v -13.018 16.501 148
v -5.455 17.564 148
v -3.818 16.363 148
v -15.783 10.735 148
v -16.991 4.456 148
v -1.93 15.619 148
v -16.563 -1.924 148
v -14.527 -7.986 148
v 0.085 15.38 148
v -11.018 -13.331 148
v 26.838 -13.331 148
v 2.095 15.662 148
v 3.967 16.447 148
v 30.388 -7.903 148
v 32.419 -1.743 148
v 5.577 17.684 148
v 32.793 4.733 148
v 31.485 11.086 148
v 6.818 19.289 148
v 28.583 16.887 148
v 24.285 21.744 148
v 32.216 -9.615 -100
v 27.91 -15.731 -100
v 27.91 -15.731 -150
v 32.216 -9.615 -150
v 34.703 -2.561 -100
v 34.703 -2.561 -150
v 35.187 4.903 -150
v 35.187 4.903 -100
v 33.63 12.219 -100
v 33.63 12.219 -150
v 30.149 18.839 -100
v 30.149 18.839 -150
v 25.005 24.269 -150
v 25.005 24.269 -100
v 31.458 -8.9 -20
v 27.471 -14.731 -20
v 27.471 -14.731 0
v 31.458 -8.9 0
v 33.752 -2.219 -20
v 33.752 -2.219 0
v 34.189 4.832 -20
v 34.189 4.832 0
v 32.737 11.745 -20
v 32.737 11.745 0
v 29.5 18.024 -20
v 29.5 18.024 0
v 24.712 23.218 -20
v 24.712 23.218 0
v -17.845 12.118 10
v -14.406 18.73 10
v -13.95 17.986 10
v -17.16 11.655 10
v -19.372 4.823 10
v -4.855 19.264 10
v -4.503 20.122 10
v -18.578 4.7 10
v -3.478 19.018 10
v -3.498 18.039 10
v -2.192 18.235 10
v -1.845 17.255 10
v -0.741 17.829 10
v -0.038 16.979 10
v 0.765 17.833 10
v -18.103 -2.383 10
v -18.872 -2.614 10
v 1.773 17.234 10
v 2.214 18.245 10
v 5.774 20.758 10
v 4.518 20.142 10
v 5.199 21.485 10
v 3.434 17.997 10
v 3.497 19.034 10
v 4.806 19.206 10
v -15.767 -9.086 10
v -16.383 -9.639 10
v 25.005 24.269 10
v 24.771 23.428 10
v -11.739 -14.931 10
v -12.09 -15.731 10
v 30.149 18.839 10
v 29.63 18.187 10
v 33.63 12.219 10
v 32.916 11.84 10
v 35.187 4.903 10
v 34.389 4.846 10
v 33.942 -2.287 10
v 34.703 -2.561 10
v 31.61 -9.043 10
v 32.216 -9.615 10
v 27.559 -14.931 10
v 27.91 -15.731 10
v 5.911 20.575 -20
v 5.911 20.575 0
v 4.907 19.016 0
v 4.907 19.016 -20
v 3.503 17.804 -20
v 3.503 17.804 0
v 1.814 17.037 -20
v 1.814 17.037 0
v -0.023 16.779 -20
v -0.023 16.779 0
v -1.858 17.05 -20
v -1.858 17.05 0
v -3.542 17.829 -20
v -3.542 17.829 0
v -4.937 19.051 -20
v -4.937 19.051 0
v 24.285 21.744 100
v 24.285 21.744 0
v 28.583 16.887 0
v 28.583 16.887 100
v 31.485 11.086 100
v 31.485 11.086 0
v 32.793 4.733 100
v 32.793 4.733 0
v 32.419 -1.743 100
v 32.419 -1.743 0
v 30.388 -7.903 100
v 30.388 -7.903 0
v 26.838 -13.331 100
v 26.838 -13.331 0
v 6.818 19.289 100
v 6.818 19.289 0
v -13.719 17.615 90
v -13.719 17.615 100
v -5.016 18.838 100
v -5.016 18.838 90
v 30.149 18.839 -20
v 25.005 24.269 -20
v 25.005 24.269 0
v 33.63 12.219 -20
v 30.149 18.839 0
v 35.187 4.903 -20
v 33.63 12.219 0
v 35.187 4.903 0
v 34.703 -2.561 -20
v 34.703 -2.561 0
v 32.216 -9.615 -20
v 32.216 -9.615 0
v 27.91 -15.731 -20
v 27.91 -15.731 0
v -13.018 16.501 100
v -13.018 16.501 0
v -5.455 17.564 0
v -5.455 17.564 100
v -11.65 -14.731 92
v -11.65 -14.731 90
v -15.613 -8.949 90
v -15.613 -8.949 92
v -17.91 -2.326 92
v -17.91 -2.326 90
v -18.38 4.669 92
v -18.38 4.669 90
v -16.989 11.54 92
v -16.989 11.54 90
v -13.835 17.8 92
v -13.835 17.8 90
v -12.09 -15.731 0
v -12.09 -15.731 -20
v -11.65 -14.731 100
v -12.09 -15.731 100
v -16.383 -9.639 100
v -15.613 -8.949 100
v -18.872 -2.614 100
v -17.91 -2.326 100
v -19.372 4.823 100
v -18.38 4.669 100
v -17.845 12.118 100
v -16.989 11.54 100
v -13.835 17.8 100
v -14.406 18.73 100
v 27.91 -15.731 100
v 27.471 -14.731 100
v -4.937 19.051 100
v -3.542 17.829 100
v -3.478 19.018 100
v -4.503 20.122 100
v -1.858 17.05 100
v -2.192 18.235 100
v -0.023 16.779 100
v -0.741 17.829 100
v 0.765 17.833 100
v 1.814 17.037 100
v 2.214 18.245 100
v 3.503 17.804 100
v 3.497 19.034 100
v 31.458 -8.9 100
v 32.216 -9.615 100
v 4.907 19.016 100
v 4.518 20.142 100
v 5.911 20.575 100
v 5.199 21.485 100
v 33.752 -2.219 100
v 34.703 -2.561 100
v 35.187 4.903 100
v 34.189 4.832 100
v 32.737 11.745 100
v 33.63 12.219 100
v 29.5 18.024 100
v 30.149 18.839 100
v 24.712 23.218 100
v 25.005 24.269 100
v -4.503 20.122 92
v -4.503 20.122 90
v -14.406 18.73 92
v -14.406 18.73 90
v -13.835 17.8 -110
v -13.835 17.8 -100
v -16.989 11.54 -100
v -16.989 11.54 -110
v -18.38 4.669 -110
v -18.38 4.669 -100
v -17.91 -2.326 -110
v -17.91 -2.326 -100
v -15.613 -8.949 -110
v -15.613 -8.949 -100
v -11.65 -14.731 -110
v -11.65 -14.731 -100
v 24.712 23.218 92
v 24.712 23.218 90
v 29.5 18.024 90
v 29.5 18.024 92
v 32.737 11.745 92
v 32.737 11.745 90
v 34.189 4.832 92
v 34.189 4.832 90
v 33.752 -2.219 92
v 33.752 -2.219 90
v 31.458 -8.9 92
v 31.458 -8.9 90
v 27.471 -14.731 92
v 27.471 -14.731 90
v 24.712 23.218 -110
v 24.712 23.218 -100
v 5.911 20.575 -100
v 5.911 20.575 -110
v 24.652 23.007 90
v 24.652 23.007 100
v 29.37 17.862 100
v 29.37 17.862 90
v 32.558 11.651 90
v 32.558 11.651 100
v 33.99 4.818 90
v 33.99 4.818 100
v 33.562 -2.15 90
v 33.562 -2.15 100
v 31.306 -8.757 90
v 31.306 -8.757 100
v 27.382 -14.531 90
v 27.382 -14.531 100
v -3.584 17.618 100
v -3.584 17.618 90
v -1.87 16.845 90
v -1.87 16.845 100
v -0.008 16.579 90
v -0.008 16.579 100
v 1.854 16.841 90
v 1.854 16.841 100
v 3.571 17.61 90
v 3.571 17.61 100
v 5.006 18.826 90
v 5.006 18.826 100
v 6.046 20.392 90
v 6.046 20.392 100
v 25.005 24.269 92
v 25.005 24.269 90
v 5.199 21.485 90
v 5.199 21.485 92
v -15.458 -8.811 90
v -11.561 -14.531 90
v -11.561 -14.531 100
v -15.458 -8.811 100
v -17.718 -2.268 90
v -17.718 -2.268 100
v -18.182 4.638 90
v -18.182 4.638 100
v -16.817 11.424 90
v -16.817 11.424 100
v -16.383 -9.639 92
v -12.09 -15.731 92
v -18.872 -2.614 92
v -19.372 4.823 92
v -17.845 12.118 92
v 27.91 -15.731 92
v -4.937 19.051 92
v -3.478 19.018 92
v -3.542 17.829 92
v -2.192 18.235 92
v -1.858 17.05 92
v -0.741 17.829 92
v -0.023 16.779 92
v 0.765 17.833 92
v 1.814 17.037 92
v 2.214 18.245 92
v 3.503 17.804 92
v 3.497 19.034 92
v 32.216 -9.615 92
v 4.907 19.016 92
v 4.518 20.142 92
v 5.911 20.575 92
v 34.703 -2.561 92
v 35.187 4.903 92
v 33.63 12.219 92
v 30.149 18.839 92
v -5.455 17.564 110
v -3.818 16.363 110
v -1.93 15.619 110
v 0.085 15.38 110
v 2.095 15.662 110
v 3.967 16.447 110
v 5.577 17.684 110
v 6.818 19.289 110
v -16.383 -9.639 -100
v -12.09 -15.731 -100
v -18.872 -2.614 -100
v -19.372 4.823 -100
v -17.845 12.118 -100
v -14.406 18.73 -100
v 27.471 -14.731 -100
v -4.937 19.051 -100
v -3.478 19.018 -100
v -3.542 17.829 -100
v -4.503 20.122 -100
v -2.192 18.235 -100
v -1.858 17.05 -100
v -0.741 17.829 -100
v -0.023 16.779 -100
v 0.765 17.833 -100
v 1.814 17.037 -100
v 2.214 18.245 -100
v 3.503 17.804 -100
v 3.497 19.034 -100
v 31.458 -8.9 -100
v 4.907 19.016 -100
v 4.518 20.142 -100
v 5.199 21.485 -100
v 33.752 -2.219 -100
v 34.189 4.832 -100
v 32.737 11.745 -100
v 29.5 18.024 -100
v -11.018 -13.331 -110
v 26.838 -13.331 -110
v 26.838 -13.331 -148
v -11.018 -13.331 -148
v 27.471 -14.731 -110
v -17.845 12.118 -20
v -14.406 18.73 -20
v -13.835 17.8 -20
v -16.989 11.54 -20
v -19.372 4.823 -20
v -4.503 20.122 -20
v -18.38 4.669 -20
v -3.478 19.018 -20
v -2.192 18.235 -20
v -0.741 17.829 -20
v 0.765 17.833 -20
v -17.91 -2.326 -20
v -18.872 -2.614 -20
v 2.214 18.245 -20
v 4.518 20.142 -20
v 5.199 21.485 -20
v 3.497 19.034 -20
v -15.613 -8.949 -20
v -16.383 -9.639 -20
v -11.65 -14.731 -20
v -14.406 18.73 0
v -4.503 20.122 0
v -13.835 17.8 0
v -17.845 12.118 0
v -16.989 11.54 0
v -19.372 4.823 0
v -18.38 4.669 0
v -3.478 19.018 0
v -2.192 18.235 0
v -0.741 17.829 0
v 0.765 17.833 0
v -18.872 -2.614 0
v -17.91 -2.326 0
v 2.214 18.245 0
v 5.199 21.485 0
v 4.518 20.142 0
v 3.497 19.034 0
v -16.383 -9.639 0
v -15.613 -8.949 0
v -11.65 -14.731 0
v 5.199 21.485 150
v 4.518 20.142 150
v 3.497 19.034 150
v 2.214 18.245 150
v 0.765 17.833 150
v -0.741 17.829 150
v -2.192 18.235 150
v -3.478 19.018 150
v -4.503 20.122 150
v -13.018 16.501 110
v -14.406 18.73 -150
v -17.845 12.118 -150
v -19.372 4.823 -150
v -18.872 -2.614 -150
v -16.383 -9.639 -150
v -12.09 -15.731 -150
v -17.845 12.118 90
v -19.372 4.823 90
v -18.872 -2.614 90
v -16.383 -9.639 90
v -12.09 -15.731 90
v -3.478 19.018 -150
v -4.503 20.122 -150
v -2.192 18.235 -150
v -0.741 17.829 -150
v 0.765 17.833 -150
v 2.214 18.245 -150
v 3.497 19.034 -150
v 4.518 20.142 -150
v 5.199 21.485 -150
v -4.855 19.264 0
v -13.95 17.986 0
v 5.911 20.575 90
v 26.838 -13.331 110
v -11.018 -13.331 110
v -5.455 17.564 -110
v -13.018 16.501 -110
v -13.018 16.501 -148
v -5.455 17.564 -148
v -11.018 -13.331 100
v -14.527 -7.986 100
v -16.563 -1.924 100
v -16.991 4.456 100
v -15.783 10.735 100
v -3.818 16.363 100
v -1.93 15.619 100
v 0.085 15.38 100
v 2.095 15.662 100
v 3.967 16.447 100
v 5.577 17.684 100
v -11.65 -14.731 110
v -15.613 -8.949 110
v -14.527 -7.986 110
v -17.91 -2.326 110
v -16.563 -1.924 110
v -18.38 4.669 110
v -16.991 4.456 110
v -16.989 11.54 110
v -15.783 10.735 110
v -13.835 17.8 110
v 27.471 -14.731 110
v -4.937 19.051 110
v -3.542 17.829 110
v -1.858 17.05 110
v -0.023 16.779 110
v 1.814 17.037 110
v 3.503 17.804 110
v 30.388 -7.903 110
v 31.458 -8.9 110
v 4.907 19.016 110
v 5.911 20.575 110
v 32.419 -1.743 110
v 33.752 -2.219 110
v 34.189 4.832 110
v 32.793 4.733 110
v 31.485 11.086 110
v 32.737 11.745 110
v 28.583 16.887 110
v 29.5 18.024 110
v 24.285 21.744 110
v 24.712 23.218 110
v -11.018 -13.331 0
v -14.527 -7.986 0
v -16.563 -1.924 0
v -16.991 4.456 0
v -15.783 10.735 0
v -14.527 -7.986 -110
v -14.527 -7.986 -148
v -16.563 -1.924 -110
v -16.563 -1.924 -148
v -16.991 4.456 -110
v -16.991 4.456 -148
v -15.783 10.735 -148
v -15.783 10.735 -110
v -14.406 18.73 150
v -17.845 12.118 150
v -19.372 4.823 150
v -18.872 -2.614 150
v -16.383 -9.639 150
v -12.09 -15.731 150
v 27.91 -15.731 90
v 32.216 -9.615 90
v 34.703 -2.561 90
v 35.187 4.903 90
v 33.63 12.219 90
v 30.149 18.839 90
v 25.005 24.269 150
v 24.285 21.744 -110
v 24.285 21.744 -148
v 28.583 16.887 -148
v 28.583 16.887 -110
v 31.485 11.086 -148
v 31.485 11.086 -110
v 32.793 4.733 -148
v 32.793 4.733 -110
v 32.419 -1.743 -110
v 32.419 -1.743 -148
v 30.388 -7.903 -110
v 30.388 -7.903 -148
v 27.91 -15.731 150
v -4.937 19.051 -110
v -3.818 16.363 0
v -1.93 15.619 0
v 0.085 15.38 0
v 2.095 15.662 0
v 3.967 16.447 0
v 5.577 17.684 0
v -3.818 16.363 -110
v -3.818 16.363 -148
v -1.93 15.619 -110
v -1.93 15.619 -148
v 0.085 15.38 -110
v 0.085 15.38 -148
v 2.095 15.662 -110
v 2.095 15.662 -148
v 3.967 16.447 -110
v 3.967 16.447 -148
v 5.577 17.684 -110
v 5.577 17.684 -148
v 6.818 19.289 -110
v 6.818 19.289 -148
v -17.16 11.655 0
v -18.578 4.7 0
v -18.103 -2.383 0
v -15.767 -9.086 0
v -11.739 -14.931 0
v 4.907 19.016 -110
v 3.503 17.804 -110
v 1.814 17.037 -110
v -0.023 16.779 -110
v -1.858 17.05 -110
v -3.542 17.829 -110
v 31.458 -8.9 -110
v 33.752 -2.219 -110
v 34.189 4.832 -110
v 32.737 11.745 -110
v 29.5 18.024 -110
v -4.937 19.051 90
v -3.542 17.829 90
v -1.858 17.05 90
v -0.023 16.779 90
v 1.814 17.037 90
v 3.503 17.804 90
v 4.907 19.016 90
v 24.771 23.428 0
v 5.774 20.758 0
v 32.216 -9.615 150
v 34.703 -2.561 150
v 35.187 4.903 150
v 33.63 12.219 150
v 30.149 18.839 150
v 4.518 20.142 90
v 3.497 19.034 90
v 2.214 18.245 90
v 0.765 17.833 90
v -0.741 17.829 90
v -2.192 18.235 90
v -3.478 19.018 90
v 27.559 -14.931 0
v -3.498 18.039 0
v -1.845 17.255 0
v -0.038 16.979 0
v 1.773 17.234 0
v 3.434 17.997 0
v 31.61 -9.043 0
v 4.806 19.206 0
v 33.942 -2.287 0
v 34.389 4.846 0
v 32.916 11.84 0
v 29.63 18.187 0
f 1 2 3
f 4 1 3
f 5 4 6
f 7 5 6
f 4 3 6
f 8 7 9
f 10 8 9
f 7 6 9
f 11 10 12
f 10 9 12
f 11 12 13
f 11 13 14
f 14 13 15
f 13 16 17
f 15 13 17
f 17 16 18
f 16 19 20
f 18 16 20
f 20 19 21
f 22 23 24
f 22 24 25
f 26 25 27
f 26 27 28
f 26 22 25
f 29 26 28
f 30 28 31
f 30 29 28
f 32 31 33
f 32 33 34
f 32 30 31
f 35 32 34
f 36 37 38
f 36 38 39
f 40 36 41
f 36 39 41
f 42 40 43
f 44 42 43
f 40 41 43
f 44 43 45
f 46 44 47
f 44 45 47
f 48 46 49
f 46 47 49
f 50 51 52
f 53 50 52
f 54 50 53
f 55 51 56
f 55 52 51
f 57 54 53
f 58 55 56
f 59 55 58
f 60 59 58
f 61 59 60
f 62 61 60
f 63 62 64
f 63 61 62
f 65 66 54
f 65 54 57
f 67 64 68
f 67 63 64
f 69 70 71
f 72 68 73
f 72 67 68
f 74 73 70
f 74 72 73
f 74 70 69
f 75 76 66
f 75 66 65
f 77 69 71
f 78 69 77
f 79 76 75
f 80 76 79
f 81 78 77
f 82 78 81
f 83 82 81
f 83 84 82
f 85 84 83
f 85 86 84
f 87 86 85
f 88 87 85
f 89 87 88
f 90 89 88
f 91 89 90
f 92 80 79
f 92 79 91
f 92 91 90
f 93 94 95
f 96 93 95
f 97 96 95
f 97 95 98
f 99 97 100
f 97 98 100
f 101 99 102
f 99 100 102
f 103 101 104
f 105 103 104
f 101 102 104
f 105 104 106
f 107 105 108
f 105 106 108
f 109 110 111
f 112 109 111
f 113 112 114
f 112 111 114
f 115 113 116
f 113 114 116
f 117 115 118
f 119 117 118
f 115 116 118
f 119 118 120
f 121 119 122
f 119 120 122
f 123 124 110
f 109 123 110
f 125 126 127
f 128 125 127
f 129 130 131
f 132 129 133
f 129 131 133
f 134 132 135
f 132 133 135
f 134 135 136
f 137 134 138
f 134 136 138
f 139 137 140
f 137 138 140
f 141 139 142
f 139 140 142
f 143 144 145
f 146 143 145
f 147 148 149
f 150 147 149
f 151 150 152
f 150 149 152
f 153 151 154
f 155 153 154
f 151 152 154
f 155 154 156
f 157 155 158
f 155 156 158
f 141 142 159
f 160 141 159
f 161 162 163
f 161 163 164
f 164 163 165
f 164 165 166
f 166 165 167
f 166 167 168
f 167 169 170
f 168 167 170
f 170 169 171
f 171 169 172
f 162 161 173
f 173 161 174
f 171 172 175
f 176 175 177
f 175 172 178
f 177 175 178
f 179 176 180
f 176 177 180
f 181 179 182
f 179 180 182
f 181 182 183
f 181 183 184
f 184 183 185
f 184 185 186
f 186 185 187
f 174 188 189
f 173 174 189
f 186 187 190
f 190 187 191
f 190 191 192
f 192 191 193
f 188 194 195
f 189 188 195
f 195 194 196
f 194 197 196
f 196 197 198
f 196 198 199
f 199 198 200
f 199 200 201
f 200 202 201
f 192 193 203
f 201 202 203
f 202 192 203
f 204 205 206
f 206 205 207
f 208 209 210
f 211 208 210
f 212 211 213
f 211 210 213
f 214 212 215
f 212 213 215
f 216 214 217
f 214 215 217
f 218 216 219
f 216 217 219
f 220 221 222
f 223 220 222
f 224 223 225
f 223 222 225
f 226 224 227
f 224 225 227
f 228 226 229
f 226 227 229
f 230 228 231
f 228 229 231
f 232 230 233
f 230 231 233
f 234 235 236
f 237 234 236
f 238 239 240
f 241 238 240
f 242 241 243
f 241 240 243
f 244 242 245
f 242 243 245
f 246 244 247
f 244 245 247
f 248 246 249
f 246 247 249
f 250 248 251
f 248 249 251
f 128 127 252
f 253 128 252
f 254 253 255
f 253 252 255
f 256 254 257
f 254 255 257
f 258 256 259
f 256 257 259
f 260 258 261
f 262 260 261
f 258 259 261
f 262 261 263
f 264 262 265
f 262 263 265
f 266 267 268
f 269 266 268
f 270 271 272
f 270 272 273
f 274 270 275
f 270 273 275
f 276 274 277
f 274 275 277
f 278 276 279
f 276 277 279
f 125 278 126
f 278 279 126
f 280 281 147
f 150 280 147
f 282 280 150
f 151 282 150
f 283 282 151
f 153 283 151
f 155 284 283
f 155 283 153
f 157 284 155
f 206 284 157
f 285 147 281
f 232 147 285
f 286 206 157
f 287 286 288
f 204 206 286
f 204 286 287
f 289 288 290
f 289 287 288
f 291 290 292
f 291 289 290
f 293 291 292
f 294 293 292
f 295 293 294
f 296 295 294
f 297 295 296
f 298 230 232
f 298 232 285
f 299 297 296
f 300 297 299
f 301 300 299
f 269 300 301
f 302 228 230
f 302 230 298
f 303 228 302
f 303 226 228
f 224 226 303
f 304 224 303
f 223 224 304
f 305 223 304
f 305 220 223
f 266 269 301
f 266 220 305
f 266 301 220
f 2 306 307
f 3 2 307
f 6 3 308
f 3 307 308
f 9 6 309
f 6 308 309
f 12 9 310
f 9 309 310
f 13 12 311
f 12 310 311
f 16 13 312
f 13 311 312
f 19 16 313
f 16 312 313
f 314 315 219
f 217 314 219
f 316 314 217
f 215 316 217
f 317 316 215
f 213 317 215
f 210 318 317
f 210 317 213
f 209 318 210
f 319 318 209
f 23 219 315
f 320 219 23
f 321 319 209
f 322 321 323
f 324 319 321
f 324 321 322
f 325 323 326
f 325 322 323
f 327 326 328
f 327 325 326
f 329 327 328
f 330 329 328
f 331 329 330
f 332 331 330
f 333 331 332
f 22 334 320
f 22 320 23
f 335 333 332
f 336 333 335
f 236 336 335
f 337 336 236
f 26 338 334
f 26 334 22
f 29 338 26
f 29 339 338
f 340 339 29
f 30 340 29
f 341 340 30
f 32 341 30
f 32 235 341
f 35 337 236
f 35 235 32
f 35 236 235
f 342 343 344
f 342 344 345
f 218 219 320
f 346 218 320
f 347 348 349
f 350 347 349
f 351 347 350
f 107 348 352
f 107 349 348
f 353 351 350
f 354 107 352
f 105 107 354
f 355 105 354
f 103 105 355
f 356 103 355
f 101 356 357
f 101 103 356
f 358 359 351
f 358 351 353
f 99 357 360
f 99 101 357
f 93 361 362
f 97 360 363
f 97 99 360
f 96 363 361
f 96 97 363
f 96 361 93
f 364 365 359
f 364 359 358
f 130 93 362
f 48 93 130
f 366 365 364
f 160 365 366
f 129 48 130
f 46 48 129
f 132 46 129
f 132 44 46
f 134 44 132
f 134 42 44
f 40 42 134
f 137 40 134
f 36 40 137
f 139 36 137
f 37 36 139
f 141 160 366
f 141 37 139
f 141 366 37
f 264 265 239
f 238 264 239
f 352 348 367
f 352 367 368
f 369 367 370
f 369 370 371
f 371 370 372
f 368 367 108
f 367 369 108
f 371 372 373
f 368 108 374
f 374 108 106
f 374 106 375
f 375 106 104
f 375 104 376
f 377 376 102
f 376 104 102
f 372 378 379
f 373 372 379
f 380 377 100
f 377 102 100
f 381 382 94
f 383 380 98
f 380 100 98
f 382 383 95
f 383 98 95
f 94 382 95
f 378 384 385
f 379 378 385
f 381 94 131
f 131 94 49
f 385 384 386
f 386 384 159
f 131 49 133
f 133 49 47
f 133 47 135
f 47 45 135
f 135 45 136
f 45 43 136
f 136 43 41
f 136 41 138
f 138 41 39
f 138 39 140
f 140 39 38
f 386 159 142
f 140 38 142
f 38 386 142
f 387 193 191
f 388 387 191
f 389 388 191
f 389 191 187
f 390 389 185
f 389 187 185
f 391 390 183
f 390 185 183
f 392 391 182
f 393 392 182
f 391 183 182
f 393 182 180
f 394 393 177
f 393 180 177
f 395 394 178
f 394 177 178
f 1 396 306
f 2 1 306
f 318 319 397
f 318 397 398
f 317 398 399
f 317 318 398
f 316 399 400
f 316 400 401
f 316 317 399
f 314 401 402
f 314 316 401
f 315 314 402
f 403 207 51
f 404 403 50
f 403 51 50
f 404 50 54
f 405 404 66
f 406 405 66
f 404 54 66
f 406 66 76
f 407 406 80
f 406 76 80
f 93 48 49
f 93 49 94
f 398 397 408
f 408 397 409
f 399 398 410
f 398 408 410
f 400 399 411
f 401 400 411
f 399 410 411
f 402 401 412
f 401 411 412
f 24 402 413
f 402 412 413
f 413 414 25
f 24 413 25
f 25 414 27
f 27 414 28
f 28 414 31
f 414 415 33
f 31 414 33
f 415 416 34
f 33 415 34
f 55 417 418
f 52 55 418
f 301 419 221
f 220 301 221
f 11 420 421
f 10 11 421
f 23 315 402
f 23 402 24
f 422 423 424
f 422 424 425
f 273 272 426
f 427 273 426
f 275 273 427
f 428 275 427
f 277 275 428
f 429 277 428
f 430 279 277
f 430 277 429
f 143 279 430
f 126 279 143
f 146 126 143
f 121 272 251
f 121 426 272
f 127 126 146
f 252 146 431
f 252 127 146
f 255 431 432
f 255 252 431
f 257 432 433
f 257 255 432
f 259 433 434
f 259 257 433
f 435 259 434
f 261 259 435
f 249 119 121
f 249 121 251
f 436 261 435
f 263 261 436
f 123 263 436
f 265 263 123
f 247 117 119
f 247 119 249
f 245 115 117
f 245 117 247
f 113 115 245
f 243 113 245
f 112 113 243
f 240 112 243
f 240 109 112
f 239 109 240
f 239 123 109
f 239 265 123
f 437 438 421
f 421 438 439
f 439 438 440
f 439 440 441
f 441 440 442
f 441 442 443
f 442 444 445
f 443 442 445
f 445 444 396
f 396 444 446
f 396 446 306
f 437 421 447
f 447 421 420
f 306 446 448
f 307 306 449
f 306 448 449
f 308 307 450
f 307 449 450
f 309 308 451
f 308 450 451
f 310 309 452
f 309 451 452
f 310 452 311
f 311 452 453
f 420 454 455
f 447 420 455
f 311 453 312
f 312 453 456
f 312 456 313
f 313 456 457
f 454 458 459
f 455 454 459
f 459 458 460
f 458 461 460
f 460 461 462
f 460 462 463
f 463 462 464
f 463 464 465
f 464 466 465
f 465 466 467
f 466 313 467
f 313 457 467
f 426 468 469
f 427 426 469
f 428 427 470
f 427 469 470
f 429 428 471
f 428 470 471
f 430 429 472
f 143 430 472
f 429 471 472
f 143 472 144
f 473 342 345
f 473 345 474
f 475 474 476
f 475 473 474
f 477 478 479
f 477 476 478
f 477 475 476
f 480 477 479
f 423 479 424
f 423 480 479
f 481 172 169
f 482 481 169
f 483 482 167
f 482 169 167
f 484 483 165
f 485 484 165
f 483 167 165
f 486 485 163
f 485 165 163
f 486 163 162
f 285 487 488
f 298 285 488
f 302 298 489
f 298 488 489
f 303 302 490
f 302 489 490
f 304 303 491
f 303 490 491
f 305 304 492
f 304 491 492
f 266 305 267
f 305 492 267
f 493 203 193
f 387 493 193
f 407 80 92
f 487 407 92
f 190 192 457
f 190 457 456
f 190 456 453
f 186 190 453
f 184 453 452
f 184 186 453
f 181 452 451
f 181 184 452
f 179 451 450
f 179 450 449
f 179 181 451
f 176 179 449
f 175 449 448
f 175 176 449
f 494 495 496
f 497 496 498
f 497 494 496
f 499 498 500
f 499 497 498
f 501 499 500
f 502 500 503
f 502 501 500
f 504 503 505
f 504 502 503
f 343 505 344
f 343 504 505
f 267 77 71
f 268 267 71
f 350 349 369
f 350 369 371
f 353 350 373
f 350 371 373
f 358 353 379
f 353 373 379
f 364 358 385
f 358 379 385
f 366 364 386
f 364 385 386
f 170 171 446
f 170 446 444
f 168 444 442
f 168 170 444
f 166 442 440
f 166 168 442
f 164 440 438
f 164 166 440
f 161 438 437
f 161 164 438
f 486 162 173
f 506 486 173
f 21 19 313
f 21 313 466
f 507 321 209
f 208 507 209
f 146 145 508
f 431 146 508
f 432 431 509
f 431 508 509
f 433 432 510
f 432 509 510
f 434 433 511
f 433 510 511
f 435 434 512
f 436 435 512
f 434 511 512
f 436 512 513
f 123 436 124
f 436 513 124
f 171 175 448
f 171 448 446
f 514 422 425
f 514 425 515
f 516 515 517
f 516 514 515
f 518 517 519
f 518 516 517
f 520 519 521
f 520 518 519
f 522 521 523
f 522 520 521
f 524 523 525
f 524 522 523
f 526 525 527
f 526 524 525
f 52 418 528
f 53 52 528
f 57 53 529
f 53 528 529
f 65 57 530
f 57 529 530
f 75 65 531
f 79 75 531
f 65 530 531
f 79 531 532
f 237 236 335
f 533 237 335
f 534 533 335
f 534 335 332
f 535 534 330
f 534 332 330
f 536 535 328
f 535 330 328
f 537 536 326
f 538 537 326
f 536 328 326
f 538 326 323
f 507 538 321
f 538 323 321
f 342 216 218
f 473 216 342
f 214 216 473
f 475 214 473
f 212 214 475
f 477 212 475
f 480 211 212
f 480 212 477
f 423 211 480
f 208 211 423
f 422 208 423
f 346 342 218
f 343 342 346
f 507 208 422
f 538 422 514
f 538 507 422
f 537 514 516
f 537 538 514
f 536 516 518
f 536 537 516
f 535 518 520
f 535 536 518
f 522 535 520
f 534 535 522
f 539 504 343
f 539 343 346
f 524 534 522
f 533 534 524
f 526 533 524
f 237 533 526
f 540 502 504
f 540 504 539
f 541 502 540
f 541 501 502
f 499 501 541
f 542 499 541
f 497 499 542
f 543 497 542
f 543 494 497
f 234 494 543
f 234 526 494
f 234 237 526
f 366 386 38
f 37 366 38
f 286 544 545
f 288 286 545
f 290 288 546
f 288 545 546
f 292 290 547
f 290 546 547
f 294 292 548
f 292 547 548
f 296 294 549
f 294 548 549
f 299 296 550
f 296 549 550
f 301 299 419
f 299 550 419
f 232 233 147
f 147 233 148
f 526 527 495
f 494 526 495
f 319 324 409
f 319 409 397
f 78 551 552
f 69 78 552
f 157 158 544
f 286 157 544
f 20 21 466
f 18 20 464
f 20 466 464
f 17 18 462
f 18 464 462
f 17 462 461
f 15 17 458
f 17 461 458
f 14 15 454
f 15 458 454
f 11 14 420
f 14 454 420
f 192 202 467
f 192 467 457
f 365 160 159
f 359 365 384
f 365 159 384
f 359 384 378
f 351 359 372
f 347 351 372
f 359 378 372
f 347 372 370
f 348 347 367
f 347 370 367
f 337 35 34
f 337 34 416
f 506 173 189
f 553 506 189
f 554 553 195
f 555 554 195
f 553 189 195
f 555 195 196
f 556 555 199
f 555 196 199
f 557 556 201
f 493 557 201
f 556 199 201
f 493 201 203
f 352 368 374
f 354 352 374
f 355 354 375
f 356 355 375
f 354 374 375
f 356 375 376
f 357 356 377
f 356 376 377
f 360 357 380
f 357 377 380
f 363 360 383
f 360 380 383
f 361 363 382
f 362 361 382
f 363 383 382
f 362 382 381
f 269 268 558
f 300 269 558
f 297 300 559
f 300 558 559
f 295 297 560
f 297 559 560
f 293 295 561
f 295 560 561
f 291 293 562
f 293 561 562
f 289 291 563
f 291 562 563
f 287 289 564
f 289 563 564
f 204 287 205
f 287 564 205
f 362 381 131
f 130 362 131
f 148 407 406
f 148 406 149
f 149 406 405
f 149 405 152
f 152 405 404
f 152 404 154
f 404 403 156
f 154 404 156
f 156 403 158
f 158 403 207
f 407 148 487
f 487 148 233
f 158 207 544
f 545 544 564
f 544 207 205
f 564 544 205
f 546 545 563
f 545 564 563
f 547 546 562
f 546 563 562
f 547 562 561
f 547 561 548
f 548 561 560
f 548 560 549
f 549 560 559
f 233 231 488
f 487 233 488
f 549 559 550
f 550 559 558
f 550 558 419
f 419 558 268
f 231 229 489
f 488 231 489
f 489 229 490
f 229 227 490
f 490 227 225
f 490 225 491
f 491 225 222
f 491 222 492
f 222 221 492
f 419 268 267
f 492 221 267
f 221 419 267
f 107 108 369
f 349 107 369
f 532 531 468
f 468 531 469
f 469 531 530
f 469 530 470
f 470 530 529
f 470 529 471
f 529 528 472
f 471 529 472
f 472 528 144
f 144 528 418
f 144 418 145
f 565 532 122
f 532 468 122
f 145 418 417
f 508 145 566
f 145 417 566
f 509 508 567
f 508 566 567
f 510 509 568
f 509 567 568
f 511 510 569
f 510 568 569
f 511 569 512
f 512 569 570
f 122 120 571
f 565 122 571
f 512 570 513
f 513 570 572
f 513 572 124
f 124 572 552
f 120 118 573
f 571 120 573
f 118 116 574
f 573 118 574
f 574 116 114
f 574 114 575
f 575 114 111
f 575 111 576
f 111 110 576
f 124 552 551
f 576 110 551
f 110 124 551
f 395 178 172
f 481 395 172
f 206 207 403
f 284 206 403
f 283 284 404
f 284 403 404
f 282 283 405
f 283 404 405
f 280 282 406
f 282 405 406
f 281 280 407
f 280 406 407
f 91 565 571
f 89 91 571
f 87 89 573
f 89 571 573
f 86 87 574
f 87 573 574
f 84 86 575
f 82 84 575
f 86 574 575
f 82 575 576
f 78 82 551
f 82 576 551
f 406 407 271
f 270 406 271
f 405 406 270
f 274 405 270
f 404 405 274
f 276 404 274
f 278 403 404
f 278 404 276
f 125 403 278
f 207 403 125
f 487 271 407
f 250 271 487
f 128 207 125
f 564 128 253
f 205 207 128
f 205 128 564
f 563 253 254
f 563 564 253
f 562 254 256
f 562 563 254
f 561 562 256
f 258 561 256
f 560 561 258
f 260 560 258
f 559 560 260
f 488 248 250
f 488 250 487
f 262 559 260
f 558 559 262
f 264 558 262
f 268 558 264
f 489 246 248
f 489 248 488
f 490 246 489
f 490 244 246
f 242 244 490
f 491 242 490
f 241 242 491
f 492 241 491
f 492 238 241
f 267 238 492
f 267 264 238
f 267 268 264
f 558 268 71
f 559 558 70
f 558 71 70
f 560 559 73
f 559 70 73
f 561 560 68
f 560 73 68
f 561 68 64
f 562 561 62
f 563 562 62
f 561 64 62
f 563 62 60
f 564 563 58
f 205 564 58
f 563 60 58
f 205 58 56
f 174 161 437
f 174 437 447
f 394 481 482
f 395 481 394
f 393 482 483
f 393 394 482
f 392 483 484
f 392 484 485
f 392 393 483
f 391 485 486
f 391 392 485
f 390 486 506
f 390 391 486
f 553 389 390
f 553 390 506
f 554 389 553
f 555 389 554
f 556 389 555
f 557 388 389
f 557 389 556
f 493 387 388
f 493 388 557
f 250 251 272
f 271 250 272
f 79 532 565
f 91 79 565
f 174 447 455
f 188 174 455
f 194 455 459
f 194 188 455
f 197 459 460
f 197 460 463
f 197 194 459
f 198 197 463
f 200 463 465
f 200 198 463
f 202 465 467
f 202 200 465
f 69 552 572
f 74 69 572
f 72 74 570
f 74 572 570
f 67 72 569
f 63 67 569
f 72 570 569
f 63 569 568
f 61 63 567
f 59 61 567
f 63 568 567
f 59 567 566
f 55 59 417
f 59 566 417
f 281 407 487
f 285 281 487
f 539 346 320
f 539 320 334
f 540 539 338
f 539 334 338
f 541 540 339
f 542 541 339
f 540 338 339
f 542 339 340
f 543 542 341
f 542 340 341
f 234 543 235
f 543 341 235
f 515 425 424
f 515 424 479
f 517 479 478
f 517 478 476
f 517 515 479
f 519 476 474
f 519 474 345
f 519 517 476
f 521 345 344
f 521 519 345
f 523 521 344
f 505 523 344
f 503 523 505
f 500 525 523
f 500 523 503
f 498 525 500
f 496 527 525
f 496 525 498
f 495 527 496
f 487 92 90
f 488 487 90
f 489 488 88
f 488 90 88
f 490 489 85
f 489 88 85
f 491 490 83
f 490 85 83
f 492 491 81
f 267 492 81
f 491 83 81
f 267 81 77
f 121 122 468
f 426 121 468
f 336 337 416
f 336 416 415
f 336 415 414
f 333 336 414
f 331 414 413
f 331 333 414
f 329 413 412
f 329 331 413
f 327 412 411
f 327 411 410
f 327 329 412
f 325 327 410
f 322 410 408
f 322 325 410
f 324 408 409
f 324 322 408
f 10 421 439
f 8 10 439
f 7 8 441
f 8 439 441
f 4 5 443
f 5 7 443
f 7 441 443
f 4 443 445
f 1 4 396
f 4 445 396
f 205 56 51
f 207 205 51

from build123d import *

# Parameters (mm, degrees)
F1_DEPTH  = 100
F3_DEPTH  = 10
F5_DEPTH  = 10
F7_DEPTH  = 2
F9_DEPTH  = 50
F10_DEPTH = 10
F11_START = 48
F11_DEPTH = 2
F13_DEPTH = 20


with BuildPart() as f1:
    # F0 (on Top) → F1 (new body)
    with BuildSketch(Plane.XY):
        with BuildLine():
            Line((-12.0897765349, -15.731314094), (27.9102234651, -15.731314094))
            ThreePointArc((27.9102234651, -15.731314094), (35.186552736, 4.9027765722), (25.0045970812, 24.268685906))
            Line((25.0045970812, 24.268685906), (5.1992357064, 21.4852238868))
            ThreePointArc((5.1992357064, 21.4852238868), (0.7654520553, 17.832613514), (-4.5033702016, 20.1216115537))
            Line((-4.5033702016, 20.1216115537), (-14.406050889, 18.7298805441))
            ThreePointArc((-14.406050889, 18.7298805441), (-19.3764079278, 1.0873626828), (-12.0897765349, -15.731314094))
        make_face()
        with BuildLine():
            ThreePointArc((-11.0175789214, -13.331314094), (-16.9820661814, 1.2521155975), (-13.0181733872, 16.5013478326))
            Line((-13.0181733872, 16.5013478326), (-5.4545185869, 17.5643501916))
            ThreePointArc((-5.4545185869, 17.5643501916), (1.0994674976, 15.455970149), (6.8184149763, 19.2891985189))
            Line((6.8184149763, 19.2891985189), (24.284750464, 21.7439318875))
            ThreePointArc((24.284750464, 21.7439318875), (32.7925833849, 4.7326981573), (26.8380258517, -13.331314094))
            Line((26.8380258517, -13.331314094), (-11.0175789214, -13.331314094))
        make_face(mode=Mode.SUBTRACT)
    extrude(amount=F1_DEPTH)

    # F2 (on face) → F3 (cut)
    with BuildSketch(Plane(origin=(0, 0, 0), x_dir=(1, 0, 0), z_dir=(0, 0, -1))):
        with BuildLine():
            Line((27.9102234651, 15.731314094), (-12.0897765349, 15.731314094))
            ThreePointArc((-12.0897765349, 15.731314094), (-19.3764079278, -1.0873626828), (-14.406050889, -18.7298805441))
            Line((-14.406050889, -18.7298805441), (-4.5033702016, -20.1216115537))
            ThreePointArc((-4.5033702016, -20.1216115537), (0.7654520553, -17.832613514), (5.1992357064, -21.4852238868))
            Line((5.1992357064, -21.4852238868), (25.0045970812, -24.268685906))
            ThreePointArc((25.0045970812, -24.268685906), (35.186552736, -4.9027765722), (27.9102234651, 15.731314094))
        make_face()
        with BuildLine():
            ThreePointArc((5.7736073555, -20.7580844998), (0.876790536, -17.040399059), (-4.8550648892, -19.2643220307))
            Line((-4.8550648892, -19.2643220307), (-13.9498000809, -17.9861403555))
            ThreePointArc((-13.9498000809, -17.9861403555), (-18.5782946315, -1.1422885446), (-11.7388791707, 14.931314094))
            Line((-11.7388791707, 14.931314094), (27.559326101, 14.931314094))
            ThreePointArc((27.559326101, 14.931314094), (34.3885624209, -4.846091997), (24.7710232347, -23.4279971846))
            Line((24.7710232347, -23.4279971846), (5.7736073555, -20.7580844998))
        make_face(mode=Mode.SUBTRACT)
    extrude(amount=-F3_DEPTH, mode=Mode.SUBTRACT)

    # F4 (on face) → F5 (cut)
    with BuildSketch(Plane.XY.offset(100)):
        with BuildLine():
            Line((-4.5033702016, 20.1216115537), (-14.406050889, 18.7298805441))
            ThreePointArc((-14.406050889, 18.7298805441), (-19.3764079278, 1.0873626828), (-12.0897765349, -15.731314094))
            Line((-12.0897765349, -15.731314094), (27.9102234651, -15.731314094))
            ThreePointArc((27.9102234651, -15.731314094), (35.186552736, 4.9027765722), (25.0045970812, 24.268685906))
            Line((25.0045970812, 24.268685906), (5.1992357064, 21.4852238868))
            ThreePointArc((5.1992357064, 21.4852238868), (0.7654520553, 17.832613514), (-4.5033702016, 20.1216115537))
        make_face()
        with BuildLine():
            ThreePointArc((-11.5610592762, -14.531314094), (-18.1792377522, 1.1697483945), (-13.7193495518, 17.6145970362))
            Line((-13.7193495518, 17.6145970362), (-5.0163959343, 18.837717402))
            ThreePointArc((-5.0163959343, 18.837717402), (0.9324597764, 16.6442918315), (6.0462768814, 20.3924746735))
            Line((6.0462768814, 20.3924746735), (24.6519111864, 23.0073260489))
            ThreePointArc((24.6519111864, 23.0073260489), (33.9895674633, 4.8177466261), (27.3815062065, -14.531314094))
            Line((27.3815062065, -14.531314094), (-11.5610592762, -14.531314094))
        make_face(mode=Mode.SUBTRACT)
    extrude(amount=-F5_DEPTH, mode=Mode.SUBTRACT)


with BuildPart() as f7:
    # F6 (on face) → F7 (new body)
    with BuildSketch(Plane.XY.offset(90)):
        with BuildLine():
            Line((-4.5033702016, 20.1216115537), (-14.406050889, 18.7298805441))
            ThreePointArc((-14.406050889, 18.7298805441), (-19.3764079278, 1.0873626828), (-12.0897765349, -15.731314094))
            Line((-12.0897765349, -15.731314094), (27.9102234651, -15.731314094))
            ThreePointArc((27.9102234651, -15.731314094), (35.186552736, 4.9027765722), (25.0045970812, 24.268685906))
            Line((25.0045970812, 24.268685906), (5.1992357064, 21.4852238868))
            ThreePointArc((5.1992357064, 21.4852238868), (0.7654520553, 17.832613514), (-4.5033702016, 20.1216115537))
        make_face()
        with BuildLine():
            ThreePointArc((-11.6501712904, -14.731314094), (-18.3787662112, 1.1560187267), (-13.8347729453, 17.8003408506))
            Line((-13.8347729453, 17.8003408506), (-4.9368157389, 19.0508671835))
            ThreePointArc((-4.9368157389, 19.0508671835), (0.9046251562, 16.8423454453), (5.9110274456, 20.5754321194))
            Line((5.9110274456, 20.5754321194), (24.7116653394, 23.217689462))
            ThreePointArc((24.7116653394, 23.217689462), (34.1890649255, 4.8319195689), (27.4706182207, -14.731314094))
            Line((27.4706182207, -14.731314094), (-11.6501712904, -14.731314094))
        make_face(mode=Mode.SUBTRACT)
    extrude(amount=F7_DEPTH)


with BuildPart() as f9:
    # F8 (on face) → F9 (new body)
    with BuildSketch(Plane.XY.offset(100)):
        with BuildLine():
            Line((-4.5033702016, 20.1216115537), (-14.406050889, 18.7298805441))
            ThreePointArc((-14.406050889, 18.7298805441), (-19.3764079278, 1.0873626828), (-12.0897765349, -15.731314094))
            Line((-12.0897765349, -15.731314094), (27.9102234651, -15.731314094))
            ThreePointArc((27.9102234651, -15.731314094), (35.186552736, 4.9027765722), (25.0045970812, 24.268685906))
            Line((25.0045970812, 24.268685906), (5.1992357064, 21.4852238868))
            ThreePointArc((5.1992357064, 21.4852238868), (0.7654520553, 17.832613514), (-4.5033702016, 20.1216115537))
        make_face()
        with BuildLine():
            Line((-13.8347729453, 17.8003408506), (-4.9368157389, 19.0508671835))
            ThreePointArc((-4.9368157389, 19.0508671835), (0.9046251562, 16.8423454453), (5.9110274456, 20.5754321194))
            Line((5.9110274456, 20.5754321194), (24.7116653394, 23.217689462))
            ThreePointArc((24.7116653394, 23.217689462), (34.1890649255, 4.8319195689), (27.4706182207, -14.731314094))
            Line((27.4706182207, -14.731314094), (-11.6501712904, -14.731314094))
            ThreePointArc((-11.6501712904, -14.731314094), (-18.3787662112, 1.1560187267), (-13.8347729453, 17.8003408506))
        make_face(mode=Mode.SUBTRACT)
        with BuildLine():
            ThreePointArc((5.9110274456, 20.5754321194), (0.9046251562, 16.8423454453), (-4.9368157389, 19.0508671835))
            Line((-4.9368157389, 19.0508671835), (-13.8347729453, 17.8003408506))
            ThreePointArc((-13.8347729453, 17.8003408506), (-18.3787662112, 1.1560187267), (-11.6501712904, -14.731314094))
            Line((-11.6501712904, -14.731314094), (27.4706182207, -14.731314094))
            ThreePointArc((27.4706182207, -14.731314094), (34.1890649255, 4.8319195689), (24.7116653394, 23.217689462))
            Line((24.7116653394, 23.217689462), (5.9110274456, 20.5754321194))
        make_face()
        with BuildLine():
            ThreePointArc((-11.5610592762, -14.531314094), (-18.1792377522, 1.1697483945), (-13.7193495518, 17.6145970362))
            Line((-13.7193495518, 17.6145970362), (-5.0163959343, 18.837717402))
            ThreePointArc((-5.0163959343, 18.837717402), (0.9324597764, 16.6442918315), (6.0462768814, 20.3924746735))
            Line((6.0462768814, 20.3924746735), (24.6519111864, 23.0073260489))
            ThreePointArc((24.6519111864, 23.0073260489), (33.9895674633, 4.8177466261), (27.3815062065, -14.531314094))
            Line((27.3815062065, -14.531314094), (-11.5610592762, -14.531314094))
        make_face(mode=Mode.SUBTRACT)
        with BuildLine():
            Line((-5.0163959343, 18.837717402), (-13.7193495518, 17.6145970362))
            ThreePointArc((-13.7193495518, 17.6145970362), (-18.1792377522, 1.1697483945), (-11.5610592762, -14.531314094))
            Line((-11.5610592762, -14.531314094), (27.3815062065, -14.531314094))
            ThreePointArc((27.3815062065, -14.531314094), (33.9895674633, 4.8177466261), (24.6519111864, 23.0073260489))
            Line((24.6519111864, 23.0073260489), (6.0462768814, 20.3924746735))
            ThreePointArc((6.0462768814, 20.3924746735), (0.9324597764, 16.6442918315), (-5.0163959343, 18.837717402))
        make_face()
        with BuildLine():
            ThreePointArc((-11.0175789214, -13.331314094), (-16.9820661814, 1.2521155975), (-13.0181733872, 16.5013478326))
            Line((-13.0181733872, 16.5013478326), (-5.4545185869, 17.5643501916))
            ThreePointArc((-5.4545185869, 17.5643501916), (1.0994674976, 15.455970149), (6.8184149763, 19.2891985189))
            Line((6.8184149763, 19.2891985189), (24.284750464, 21.7439318875))
            ThreePointArc((24.284750464, 21.7439318875), (32.7925833849, 4.7326981573), (26.8380258517, -13.331314094))
            Line((26.8380258517, -13.331314094), (-11.0175789214, -13.331314094))
        make_face(mode=Mode.SUBTRACT)
    extrude(amount=F9_DEPTH)

    # F8 (on face) → F10 (cut)
    with BuildSketch(Plane.XY.offset(100)):
        with BuildLine():
            ThreePointArc((5.9110274456, 20.5754321194), (0.9046251562, 16.8423454453), (-4.9368157389, 19.0508671835))
            Line((-4.9368157389, 19.0508671835), (-13.8347729453, 17.8003408506))
            ThreePointArc((-13.8347729453, 17.8003408506), (-18.3787662112, 1.1560187267), (-11.6501712904, -14.731314094))
            Line((-11.6501712904, -14.731314094), (27.4706182207, -14.731314094))
            ThreePointArc((27.4706182207, -14.731314094), (34.1890649255, 4.8319195689), (24.7116653394, 23.217689462))
            Line((24.7116653394, 23.217689462), (5.9110274456, 20.5754321194))
        make_face()
        with BuildLine():
            ThreePointArc((-11.5610592762, -14.531314094), (-18.1792377522, 1.1697483945), (-13.7193495518, 17.6145970362))
            Line((-13.7193495518, 17.6145970362), (-5.0163959343, 18.837717402))
            ThreePointArc((-5.0163959343, 18.837717402), (0.9324597764, 16.6442918315), (6.0462768814, 20.3924746735))
            Line((6.0462768814, 20.3924746735), (24.6519111864, 23.0073260489))
            ThreePointArc((24.6519111864, 23.0073260489), (33.9895674633, 4.8177466261), (27.3815062065, -14.531314094))
            Line((27.3815062065, -14.531314094), (-11.5610592762, -14.531314094))
        make_face(mode=Mode.SUBTRACT)
        with BuildLine():
            Line((-5.0163959343, 18.837717402), (-13.7193495518, 17.6145970362))
            ThreePointArc((-13.7193495518, 17.6145970362), (-18.1792377522, 1.1697483945), (-11.5610592762, -14.531314094))
            Line((-11.5610592762, -14.531314094), (27.3815062065, -14.531314094))
            ThreePointArc((27.3815062065, -14.531314094), (33.9895674633, 4.8177466261), (24.6519111864, 23.0073260489))
            Line((24.6519111864, 23.0073260489), (6.0462768814, 20.3924746735))
            ThreePointArc((6.0462768814, 20.3924746735), (0.9324597764, 16.6442918315), (-5.0163959343, 18.837717402))
        make_face()
        with BuildLine():
            ThreePointArc((-11.0175789214, -13.331314094), (-16.9820661814, 1.2521155975), (-13.0181733872, 16.5013478326))
            Line((-13.0181733872, 16.5013478326), (-5.4545185869, 17.5643501916))
            ThreePointArc((-5.4545185869, 17.5643501916), (1.0994674976, 15.455970149), (6.8184149763, 19.2891985189))
            Line((6.8184149763, 19.2891985189), (24.284750464, 21.7439318875))
            ThreePointArc((24.284750464, 21.7439318875), (32.7925833849, 4.7326981573), (26.8380258517, -13.331314094))
            Line((26.8380258517, -13.331314094), (-11.0175789214, -13.331314094))
        make_face(mode=Mode.SUBTRACT)
    extrude(amount=F10_DEPTH, mode=Mode.SUBTRACT)

    # F8 (on face) → F11 (join)
    with BuildSketch(Plane.XY.offset(100).offset(F11_START)):
        with BuildLine():
            Line((-5.4545185869, 17.5643501916), (-13.0181733872, 16.5013478326))
            ThreePointArc((-13.0181733872, 16.5013478326), (-16.9820661814, 1.2521155975), (-11.0175789214, -13.331314094))
            Line((-11.0175789214, -13.331314094), (26.8380258517, -13.331314094))
            ThreePointArc((26.8380258517, -13.331314094), (32.7925833849, 4.7326981573), (24.284750464, 21.7439318875))
            Line((24.284750464, 21.7439318875), (6.8184149763, 19.2891985189))
            ThreePointArc((6.8184149763, 19.2891985189), (1.0994674976, 15.455970149), (-5.4545185869, 17.5643501916))
        make_face()
    extrude(amount=F11_DEPTH)


with BuildPart() as f13:
    # F12 (on face) → F13 (new body)
    with BuildSketch(Plane(origin=(0, 0, 0), x_dir=(1, 0, 0), z_dir=(0, 0, -1))):
        with BuildLine():
            ThreePointArc((-12.0897765349, 15.731314094), (-19.3764079278, -1.0873626828), (-14.406050889, -18.7298805441))
            Line((-14.406050889, -18.7298805441), (-4.5033702016, -20.1216115537))
            ThreePointArc((-4.5033702016, -20.1216115537), (0.7654520553, -17.832613514), (5.1992357064, -21.4852238868))
            Line((5.1992357064, -21.4852238868), (25.0045970812, -24.268685906))
            ThreePointArc((25.0045970812, -24.268685906), (35.186552736, -4.9027765722), (27.9102234651, 15.731314094))
            Line((27.9102234651, 15.731314094), (-12.0897765349, 15.731314094))
        make_face()
        with BuildLine():
            ThreePointArc((5.9110274456, -20.5754321194), (0.9046251562, -16.8423454453), (-4.9368157389, -19.0508671835))
            Line((-4.9368157389, -19.0508671835), (-13.8347729453, -17.8003408506))
            ThreePointArc((-13.8347729453, -17.8003408506), (-18.3787662112, -1.1560187267), (-11.6501712904, 14.731314094))
            Line((-11.6501712904, 14.731314094), (27.4706182207, 14.731314094))
            ThreePointArc((27.4706182207, 14.731314094), (34.1890649255, -4.8319195689), (24.7116653394, -23.217689462))
            Line((24.7116653394, -23.217689462), (5.9110274456, -20.5754321194))
        make_face(mode=Mode.SUBTRACT)
    extrude(amount=F13_DEPTH)


with BuildPart() as f14_1:
    # F14: instance of F9
    add(f9.part.mirror(Plane.XY))


solid = Compound([f1.part, f7.part, f9.part, f13.part, f14_1.part])
